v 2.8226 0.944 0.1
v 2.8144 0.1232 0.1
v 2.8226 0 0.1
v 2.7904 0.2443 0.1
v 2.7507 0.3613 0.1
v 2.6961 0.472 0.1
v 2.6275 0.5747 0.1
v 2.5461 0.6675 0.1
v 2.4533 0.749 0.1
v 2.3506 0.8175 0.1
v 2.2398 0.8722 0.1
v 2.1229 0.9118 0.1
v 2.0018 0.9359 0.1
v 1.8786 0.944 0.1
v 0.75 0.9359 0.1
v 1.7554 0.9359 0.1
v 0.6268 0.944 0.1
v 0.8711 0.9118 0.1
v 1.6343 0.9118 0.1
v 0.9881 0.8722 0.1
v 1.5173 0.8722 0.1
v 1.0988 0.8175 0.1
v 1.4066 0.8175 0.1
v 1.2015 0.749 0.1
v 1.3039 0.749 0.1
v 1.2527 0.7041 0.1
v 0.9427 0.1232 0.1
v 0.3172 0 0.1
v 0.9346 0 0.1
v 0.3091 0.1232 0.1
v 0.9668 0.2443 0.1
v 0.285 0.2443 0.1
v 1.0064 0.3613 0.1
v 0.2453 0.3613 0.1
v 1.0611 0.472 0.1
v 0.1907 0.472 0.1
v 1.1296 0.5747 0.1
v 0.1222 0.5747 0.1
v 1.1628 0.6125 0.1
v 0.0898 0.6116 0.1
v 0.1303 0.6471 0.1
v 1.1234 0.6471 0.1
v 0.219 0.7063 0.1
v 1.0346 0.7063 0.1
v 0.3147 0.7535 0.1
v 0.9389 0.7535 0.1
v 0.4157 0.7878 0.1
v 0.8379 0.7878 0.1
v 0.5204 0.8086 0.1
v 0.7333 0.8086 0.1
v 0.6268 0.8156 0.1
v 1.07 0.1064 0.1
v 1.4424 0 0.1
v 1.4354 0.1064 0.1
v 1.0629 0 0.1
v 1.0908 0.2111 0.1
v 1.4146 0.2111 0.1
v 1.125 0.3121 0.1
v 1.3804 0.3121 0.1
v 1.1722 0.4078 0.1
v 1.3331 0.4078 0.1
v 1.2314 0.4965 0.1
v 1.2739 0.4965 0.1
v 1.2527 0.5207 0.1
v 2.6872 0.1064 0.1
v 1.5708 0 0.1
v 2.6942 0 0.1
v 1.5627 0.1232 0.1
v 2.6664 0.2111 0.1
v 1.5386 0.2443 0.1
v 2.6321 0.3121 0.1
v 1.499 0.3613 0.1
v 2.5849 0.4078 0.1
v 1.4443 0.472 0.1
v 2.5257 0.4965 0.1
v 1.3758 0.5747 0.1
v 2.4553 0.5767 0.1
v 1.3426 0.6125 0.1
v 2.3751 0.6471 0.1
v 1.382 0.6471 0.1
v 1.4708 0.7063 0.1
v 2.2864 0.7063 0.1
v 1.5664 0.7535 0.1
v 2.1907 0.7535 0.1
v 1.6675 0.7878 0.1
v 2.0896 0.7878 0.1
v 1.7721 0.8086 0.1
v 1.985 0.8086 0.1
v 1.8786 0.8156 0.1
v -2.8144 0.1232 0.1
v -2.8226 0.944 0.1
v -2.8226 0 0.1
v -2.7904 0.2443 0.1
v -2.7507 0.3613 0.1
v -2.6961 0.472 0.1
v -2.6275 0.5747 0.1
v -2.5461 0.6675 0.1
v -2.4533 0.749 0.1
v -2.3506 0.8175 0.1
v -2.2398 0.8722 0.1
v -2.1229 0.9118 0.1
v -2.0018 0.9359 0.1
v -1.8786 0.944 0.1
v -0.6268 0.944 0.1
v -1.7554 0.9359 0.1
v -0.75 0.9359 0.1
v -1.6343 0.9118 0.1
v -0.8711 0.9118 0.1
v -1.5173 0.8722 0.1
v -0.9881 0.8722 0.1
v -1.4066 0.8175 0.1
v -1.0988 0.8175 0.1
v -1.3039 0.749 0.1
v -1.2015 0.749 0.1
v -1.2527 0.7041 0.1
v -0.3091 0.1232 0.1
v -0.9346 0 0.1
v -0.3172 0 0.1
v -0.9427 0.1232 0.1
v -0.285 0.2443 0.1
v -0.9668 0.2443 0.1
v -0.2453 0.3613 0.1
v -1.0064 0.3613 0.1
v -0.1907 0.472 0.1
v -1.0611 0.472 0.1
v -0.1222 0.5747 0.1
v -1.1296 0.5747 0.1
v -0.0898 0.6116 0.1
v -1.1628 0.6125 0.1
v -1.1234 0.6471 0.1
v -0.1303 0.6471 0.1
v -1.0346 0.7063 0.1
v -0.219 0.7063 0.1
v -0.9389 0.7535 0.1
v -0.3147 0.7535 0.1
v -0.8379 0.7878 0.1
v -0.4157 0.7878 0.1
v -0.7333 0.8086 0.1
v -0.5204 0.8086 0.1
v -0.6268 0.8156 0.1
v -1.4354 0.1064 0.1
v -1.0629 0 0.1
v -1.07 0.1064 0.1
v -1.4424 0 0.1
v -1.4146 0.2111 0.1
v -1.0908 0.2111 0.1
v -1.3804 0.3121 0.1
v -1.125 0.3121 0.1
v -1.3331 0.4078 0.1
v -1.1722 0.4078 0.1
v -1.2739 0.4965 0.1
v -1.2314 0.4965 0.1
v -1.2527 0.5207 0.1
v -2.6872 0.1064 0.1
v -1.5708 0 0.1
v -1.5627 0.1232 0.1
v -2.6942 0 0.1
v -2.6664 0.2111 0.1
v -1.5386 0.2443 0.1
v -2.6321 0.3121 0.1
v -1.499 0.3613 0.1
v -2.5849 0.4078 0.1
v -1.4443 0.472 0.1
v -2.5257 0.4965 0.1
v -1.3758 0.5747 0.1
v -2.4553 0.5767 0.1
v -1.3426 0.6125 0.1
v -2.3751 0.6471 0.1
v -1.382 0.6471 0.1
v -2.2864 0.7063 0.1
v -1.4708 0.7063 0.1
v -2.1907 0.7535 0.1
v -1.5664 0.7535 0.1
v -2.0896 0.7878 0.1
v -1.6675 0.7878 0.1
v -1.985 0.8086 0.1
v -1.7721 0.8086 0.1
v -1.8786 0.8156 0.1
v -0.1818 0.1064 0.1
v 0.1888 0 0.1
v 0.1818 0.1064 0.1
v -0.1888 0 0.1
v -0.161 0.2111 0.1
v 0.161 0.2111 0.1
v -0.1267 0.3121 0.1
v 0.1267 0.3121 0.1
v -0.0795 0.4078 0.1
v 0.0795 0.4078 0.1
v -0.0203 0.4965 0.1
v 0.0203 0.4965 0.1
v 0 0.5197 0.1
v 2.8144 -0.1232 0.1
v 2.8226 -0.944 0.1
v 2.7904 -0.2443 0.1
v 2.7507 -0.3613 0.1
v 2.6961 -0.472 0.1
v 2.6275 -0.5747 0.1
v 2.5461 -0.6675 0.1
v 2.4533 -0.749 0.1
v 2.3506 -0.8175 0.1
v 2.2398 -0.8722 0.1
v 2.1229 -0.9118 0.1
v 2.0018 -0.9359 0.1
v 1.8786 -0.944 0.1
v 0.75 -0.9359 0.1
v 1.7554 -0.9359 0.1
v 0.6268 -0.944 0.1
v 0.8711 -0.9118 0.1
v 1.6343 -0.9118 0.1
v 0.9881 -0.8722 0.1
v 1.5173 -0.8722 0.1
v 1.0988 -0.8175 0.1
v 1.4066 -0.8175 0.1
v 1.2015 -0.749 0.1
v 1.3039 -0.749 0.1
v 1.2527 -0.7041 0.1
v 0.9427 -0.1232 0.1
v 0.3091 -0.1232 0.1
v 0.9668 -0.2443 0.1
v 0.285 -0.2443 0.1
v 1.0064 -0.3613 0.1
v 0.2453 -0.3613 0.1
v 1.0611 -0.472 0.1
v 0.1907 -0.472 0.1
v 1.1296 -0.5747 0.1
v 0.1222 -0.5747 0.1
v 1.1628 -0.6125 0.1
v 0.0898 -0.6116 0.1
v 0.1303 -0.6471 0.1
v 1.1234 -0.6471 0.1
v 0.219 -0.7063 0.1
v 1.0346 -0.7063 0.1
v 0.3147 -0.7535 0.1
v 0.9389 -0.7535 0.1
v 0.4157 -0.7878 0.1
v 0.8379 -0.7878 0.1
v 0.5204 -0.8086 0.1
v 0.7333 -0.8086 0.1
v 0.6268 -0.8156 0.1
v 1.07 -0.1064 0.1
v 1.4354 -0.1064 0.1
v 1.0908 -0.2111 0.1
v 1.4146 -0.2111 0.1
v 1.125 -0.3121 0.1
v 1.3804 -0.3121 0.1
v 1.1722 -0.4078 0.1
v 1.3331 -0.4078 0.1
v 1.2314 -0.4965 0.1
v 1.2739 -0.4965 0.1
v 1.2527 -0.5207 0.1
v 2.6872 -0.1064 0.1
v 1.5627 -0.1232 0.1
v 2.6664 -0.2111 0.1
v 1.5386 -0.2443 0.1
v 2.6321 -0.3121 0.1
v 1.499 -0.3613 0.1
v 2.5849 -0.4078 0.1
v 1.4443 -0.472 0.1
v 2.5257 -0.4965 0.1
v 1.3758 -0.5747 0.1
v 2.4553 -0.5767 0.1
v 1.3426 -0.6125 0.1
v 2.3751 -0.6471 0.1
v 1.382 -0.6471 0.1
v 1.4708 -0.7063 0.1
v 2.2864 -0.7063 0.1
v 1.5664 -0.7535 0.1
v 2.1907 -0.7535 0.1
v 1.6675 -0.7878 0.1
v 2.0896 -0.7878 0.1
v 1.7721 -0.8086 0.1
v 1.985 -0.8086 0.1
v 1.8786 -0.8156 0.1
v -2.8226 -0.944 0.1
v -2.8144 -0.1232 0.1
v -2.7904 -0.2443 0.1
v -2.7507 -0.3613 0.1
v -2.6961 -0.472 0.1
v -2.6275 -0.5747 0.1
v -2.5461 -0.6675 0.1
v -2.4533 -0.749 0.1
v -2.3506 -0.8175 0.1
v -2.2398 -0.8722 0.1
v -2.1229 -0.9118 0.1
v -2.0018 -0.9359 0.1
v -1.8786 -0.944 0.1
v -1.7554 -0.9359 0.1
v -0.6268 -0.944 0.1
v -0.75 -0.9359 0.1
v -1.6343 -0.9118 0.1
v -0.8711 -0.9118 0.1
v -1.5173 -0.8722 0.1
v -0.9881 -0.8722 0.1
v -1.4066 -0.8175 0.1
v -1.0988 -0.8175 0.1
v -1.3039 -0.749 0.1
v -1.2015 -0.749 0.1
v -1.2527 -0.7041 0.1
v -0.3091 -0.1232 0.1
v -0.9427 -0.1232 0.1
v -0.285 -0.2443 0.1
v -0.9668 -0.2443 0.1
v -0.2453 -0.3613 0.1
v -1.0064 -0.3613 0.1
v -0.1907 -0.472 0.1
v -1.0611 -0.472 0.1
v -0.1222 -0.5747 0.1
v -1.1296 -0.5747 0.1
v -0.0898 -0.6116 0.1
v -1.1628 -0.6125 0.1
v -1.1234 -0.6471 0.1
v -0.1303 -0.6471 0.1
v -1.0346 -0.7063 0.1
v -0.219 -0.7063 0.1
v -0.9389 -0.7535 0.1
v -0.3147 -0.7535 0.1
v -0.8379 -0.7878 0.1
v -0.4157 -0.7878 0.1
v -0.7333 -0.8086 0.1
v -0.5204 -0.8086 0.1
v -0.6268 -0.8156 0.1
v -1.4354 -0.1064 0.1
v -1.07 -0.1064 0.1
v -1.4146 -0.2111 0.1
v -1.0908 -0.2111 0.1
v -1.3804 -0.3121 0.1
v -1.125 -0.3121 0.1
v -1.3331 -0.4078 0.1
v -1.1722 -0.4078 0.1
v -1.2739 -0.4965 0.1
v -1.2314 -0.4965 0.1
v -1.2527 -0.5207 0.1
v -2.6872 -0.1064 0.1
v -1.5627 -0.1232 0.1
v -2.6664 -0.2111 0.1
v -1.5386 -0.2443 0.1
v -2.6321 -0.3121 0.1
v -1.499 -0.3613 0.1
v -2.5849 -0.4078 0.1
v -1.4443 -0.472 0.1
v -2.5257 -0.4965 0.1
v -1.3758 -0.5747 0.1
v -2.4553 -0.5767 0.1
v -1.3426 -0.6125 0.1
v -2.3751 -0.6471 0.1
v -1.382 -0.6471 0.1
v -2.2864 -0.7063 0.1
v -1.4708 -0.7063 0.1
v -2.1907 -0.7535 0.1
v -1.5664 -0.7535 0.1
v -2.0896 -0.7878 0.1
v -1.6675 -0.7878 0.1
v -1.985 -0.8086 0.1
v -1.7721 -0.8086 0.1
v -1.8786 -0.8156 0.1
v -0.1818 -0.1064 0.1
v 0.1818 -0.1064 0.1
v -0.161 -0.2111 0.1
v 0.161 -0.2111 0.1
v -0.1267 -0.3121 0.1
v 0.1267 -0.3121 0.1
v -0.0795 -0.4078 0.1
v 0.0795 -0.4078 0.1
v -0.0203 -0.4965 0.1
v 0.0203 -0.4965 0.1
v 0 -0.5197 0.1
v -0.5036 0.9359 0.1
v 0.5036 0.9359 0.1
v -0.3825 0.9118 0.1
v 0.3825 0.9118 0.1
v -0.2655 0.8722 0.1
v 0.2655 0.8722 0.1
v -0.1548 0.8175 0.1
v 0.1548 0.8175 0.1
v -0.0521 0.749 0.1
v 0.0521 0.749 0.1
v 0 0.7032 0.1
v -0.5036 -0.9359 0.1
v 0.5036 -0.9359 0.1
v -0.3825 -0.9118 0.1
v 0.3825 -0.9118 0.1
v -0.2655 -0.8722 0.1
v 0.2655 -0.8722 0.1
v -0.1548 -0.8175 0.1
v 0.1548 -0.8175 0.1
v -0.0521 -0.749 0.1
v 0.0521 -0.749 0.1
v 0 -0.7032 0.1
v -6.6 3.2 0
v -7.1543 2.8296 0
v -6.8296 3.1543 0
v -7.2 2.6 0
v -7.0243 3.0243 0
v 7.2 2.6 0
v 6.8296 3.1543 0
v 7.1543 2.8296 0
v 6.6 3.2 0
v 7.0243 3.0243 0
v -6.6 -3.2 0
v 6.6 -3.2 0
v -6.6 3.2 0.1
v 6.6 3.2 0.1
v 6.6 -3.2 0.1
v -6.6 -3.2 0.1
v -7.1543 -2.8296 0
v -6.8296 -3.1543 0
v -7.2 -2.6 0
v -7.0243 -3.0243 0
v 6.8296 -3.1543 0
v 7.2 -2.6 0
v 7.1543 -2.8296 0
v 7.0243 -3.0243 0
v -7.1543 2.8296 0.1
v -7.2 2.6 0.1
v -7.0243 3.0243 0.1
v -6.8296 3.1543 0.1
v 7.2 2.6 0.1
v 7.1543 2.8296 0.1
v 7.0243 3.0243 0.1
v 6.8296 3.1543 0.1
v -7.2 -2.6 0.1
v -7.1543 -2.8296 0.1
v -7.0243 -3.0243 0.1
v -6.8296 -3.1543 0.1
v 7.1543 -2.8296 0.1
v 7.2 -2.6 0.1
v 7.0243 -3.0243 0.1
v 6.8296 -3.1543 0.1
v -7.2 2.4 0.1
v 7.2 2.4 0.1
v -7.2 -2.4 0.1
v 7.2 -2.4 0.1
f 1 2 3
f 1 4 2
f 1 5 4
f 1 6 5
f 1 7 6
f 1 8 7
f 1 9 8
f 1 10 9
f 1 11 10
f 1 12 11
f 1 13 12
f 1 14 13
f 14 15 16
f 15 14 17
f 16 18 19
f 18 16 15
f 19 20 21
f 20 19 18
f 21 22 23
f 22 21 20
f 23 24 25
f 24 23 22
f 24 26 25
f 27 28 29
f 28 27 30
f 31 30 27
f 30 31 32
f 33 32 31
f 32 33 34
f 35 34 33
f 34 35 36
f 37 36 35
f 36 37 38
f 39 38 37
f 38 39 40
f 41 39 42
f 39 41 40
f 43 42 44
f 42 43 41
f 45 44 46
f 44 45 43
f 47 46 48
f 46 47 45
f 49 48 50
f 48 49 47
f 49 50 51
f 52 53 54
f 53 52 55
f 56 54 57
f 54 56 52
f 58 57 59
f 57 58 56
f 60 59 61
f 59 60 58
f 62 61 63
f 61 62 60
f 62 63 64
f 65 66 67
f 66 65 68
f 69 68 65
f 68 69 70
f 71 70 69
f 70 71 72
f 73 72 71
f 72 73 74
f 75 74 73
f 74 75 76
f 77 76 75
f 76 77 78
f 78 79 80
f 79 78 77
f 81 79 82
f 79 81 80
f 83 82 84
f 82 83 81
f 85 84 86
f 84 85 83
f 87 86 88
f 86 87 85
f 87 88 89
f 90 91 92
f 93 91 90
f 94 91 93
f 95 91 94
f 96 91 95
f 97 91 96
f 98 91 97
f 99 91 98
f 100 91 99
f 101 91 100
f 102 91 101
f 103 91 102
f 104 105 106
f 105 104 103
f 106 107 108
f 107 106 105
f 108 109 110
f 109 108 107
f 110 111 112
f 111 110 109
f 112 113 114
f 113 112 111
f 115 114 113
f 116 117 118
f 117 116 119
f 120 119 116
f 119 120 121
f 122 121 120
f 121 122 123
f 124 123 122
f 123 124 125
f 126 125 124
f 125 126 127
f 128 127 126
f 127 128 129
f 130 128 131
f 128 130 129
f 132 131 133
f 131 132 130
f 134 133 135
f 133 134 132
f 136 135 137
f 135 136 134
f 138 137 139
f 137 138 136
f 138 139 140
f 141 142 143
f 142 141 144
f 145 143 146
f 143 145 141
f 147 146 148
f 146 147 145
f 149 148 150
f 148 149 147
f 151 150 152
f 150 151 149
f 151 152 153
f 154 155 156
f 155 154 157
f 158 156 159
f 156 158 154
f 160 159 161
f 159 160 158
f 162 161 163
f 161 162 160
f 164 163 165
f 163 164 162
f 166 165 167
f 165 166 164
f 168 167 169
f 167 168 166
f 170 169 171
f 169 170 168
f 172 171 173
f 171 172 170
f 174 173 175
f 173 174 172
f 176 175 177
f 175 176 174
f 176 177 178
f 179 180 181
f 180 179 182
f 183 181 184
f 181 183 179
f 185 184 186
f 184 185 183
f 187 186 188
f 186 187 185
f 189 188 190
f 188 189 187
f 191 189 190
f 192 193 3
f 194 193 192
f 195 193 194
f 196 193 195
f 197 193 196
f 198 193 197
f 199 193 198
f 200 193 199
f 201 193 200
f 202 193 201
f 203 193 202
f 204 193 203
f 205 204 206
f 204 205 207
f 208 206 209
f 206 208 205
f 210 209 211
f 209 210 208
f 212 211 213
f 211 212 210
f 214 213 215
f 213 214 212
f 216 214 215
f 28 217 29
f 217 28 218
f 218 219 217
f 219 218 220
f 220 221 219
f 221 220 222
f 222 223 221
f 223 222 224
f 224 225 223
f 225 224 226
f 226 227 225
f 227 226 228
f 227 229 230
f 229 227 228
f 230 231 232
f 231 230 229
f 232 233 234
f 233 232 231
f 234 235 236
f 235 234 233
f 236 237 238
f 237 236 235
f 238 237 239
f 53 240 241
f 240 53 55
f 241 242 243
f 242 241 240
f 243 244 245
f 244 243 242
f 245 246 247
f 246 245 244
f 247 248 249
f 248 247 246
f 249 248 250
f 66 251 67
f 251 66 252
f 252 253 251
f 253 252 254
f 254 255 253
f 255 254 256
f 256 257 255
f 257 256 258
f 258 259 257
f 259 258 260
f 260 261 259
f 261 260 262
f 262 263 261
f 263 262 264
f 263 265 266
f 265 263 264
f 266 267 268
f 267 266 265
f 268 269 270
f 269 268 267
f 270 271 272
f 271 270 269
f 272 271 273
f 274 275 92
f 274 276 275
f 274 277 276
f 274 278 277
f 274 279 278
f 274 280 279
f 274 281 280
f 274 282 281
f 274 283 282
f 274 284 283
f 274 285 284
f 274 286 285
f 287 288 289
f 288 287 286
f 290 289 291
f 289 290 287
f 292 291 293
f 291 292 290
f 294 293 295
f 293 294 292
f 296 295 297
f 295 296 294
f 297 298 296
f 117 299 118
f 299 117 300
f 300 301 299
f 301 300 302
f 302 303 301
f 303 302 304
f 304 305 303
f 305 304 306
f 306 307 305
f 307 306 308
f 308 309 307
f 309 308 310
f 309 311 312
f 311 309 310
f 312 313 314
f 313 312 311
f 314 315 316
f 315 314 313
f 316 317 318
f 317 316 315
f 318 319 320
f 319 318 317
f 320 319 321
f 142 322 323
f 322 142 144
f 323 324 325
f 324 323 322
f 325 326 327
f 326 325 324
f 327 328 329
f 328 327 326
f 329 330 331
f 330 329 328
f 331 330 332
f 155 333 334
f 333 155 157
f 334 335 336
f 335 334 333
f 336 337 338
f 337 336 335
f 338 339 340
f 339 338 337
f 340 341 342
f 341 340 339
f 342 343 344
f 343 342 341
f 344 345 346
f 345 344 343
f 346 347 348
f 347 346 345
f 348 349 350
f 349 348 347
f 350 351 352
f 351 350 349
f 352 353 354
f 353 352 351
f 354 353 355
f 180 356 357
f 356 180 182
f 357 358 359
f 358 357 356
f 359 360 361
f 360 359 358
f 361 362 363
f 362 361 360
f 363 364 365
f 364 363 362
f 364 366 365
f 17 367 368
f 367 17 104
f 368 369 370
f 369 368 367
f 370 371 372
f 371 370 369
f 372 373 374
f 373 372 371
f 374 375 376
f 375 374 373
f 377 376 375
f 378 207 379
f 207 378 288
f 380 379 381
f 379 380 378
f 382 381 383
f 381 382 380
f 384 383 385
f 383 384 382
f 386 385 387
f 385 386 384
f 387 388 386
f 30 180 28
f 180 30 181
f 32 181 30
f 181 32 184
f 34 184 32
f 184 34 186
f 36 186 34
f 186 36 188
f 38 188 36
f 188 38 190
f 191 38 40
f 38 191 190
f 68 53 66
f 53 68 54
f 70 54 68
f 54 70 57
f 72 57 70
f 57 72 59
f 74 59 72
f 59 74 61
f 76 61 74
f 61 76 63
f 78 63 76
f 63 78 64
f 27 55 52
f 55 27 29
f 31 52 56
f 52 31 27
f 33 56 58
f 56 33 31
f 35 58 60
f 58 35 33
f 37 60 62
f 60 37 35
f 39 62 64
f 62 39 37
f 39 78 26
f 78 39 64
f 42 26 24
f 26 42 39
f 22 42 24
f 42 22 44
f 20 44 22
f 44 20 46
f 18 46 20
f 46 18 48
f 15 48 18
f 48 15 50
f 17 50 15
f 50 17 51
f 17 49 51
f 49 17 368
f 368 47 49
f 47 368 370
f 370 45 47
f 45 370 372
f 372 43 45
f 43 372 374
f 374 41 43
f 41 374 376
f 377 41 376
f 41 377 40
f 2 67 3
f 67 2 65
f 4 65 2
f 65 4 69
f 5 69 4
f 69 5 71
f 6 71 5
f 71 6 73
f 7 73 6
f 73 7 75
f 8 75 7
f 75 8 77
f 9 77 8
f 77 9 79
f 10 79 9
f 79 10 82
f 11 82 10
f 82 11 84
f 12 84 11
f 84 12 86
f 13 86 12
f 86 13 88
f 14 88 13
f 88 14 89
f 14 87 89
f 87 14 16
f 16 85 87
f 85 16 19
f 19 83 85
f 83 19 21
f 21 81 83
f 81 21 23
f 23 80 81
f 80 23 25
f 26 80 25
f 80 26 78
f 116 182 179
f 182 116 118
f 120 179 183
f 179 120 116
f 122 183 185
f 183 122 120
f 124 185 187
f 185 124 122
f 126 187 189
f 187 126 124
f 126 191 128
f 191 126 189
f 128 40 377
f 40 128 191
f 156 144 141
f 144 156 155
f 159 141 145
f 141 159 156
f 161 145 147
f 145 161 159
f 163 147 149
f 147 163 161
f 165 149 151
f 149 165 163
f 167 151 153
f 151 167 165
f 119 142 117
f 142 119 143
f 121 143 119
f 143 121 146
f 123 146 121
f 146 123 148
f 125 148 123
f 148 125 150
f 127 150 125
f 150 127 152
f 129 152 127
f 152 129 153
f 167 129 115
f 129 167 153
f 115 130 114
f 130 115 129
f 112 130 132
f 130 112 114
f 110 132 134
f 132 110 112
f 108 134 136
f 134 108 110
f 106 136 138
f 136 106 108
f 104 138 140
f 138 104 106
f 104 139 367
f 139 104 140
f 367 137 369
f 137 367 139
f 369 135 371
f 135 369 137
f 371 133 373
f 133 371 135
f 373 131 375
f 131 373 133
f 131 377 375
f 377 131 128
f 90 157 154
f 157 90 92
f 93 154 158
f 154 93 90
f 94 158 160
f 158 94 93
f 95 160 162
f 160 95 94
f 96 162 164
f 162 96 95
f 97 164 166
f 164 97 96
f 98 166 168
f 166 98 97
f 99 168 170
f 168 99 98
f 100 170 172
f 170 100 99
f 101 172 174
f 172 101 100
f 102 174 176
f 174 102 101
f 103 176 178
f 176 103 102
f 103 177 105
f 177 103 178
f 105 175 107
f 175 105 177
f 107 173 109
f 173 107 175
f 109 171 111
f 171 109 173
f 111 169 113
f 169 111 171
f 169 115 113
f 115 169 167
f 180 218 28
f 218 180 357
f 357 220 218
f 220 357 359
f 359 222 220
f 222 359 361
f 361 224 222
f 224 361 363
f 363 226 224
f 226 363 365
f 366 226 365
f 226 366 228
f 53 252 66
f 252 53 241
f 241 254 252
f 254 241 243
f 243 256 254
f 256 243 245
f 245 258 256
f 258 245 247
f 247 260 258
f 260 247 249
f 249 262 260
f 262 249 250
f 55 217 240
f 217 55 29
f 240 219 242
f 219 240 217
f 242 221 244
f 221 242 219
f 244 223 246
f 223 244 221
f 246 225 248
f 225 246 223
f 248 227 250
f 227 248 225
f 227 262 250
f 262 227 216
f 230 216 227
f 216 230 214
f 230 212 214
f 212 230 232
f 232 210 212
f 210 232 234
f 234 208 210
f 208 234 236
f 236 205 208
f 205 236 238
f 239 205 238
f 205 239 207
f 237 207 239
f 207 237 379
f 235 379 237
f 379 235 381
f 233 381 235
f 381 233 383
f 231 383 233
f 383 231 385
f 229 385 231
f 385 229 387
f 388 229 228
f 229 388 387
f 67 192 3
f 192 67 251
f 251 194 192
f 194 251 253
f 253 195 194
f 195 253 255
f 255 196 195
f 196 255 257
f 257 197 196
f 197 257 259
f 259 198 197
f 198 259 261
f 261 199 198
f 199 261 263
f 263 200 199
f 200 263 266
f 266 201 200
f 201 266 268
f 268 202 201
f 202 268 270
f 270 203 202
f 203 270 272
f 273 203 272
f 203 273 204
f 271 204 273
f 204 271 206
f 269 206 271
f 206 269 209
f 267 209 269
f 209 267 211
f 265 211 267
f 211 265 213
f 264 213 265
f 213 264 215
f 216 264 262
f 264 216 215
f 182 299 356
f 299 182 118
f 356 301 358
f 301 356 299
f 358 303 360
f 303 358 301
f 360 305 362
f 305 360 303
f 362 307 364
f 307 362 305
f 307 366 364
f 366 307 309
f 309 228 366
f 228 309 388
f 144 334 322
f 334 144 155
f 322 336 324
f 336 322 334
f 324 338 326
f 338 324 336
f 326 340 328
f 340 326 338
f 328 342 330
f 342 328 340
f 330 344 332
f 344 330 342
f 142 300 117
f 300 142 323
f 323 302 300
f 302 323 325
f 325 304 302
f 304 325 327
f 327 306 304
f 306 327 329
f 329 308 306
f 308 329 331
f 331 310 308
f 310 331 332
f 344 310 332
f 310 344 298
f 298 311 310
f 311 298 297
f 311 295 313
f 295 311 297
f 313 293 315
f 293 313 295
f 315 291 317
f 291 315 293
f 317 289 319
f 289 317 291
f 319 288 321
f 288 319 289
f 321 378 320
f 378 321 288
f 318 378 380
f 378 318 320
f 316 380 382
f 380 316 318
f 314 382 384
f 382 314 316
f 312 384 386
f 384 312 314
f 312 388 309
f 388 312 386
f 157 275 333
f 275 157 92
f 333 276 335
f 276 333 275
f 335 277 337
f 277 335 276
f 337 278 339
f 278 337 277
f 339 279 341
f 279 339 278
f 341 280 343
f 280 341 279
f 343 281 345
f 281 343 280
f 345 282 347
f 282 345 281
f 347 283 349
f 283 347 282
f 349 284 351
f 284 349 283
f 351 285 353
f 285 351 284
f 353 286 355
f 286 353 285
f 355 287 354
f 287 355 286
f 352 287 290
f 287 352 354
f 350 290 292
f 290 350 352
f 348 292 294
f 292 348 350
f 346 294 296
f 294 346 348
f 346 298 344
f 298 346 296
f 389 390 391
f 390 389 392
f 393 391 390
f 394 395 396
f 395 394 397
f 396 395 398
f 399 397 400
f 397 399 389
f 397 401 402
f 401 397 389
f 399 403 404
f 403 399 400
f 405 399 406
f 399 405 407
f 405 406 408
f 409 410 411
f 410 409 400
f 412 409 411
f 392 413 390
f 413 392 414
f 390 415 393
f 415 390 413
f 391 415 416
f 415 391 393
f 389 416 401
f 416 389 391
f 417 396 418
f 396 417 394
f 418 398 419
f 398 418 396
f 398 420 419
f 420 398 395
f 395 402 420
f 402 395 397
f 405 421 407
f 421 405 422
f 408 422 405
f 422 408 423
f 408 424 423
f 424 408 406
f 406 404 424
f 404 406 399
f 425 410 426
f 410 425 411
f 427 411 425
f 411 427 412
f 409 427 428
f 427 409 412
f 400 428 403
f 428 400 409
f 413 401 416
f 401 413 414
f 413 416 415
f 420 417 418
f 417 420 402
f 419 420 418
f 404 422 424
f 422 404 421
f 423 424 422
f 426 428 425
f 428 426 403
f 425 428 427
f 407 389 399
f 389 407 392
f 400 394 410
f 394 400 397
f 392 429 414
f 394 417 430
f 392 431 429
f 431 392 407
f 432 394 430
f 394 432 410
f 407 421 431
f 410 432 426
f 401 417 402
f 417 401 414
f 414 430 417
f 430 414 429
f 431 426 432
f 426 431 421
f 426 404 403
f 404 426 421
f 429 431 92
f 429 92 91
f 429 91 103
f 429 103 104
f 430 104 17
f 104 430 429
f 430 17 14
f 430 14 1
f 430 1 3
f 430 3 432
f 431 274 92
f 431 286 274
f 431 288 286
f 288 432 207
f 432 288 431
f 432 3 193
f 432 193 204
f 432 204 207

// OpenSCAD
use <../lib.scad>
use <../p/1-4chrd.scad>
use <../p/1-4cyli.scad>
use <../p/box3u12.scad>
use <../p/logo-audi-ring-outerbox.scad>
use <../p/logo-audi-ring.scad>
function ldraw_lib__6142271q() = [
// 0 Sticker  0.8 x  1.8 with White Audi Logo on Red Stripe on Black Background
// 0 Name: 6142271q.dat
// 0 Author: Massimo Maso [Sirio]
// 0 !LDRAW_ORG Part UPDATE 2025-02
// 0 !LICENSE Licensed under CC BY 4.0 : see CAreadme.txt
// 
// 0 BFC CERTIFY CCW
  [0,"BFC","CERTIFY"],
  [0,"BFC","CCW"],
// 
// 0 !KEYWORDS Bricklink 75873stk01a, Brickowl 427960, LMS, R8, Rebrickable 24755
// 0 !KEYWORDS Set 75873, Speed Champions, Ultra
// 
// 0 !HISTORY 2025-02-27 [OrionP] Official Update 2025-02
// 
// 0 // Logo primitives
// 1 4 0 -.25 0 .236 0 0 0 1 0 0 0 .236 logo-audi-ring-outerbox.dat
  [1,4,0,-.25,0,.236,0,0,0,1,0,0,0,.236, ldraw_lib__logo_audi_ring_outerbox()],
// 1 15 0 -.25 0 .236 0 0 0 1 0 0 0 .236 logo-audi-ring.dat
  [1,15,0,-.25,0,.236,0,0,0,1,0,0,0,.236, ldraw_lib__logo_audi_ring()],
// 0 // Primitives
// 1 16 -16.5 0 6.5 -1.5 0 0 0 -1 0 0 0 1.5 1-4chrd.dat
  [1,16,-16.5,0,6.5,-1.5,0,0,0,-1,0,0,0,1.5, ldraw_lib__1_4chrd()],
// 1 16 16.5 0 6.5 1.5 0 0 0 -1 0 0 0 1.5 1-4chrd.dat
  [1,16,16.5,0,6.5,1.5,0,0,0,-1,0,0,0,1.5, ldraw_lib__1_4chrd()],
// 1 16 0 -.25 0 16.5 0 0 0 .25 0 0 0 8 box3u12.dat
  [1,16,0,-.25,0,16.5,0,0,0,.25,0,0,0,8, ldraw_lib__box3u12()],
// 1 16 -16.5 0 -6.5 -1.5 0 0 0 -1 0 0 0 -1.5 1-4chrd.dat
  [1,16,-16.5,0,-6.5,-1.5,0,0,0,-1,0,0,0,-1.5, ldraw_lib__1_4chrd()],
// 1 16 16.5 0 -6.5 1.5 0 0 0 -1 0 0 0 -1.5 1-4chrd.dat
  [1,16,16.5,0,-6.5,1.5,0,0,0,-1,0,0,0,-1.5, ldraw_lib__1_4chrd()],
// 1 16 -16.5 0 6.5 -1.5 0 0 0 -.25 0 0 0 1.5 1-4cyli.dat
  [1,16,-16.5,0,6.5,-1.5,0,0,0,-.25,0,0,0,1.5, ldraw_lib__1_4cyli()],
// 1 16 16.5 0 6.5 1.5 0 0 0 -.25 0 0 0 1.5 1-4cyli.dat
  [1,16,16.5,0,6.5,1.5,0,0,0,-.25,0,0,0,1.5, ldraw_lib__1_4cyli()],
// 1 16 -16.5 0 -6.5 -1.5 0 0 0 -.25 0 0 0 -1.5 1-4cyli.dat
  [1,16,-16.5,0,-6.5,-1.5,0,0,0,-.25,0,0,0,-1.5, ldraw_lib__1_4cyli()],
// 1 16 16.5 0 -6.5 1.5 0 0 0 -.25 0 0 0 -1.5 1-4cyli.dat
  [1,16,16.5,0,-6.5,1.5,0,0,0,-.25,0,0,0,-1.5, ldraw_lib__1_4cyli()],
// 1 0 -16.5 -.25 6.5 -1.5 0 0 0 1 0 0 0 1.5 1-4chrd.dat
  [1,0,-16.5,-.25,6.5,-1.5,0,0,0,1,0,0,0,1.5, ldraw_lib__1_4chrd()],
// 1 0 16.5 -.25 6.5 1.5 0 0 0 1 0 0 0 1.5 1-4chrd.dat
  [1,0,16.5,-.25,6.5,1.5,0,0,0,1,0,0,0,1.5, ldraw_lib__1_4chrd()],
// 1 0 -16.5 -.25 -6.5 -1.5 0 0 0 1 0 0 0 -1.5 1-4chrd.dat
  [1,0,-16.5,-.25,-6.5,-1.5,0,0,0,1,0,0,0,-1.5, ldraw_lib__1_4chrd()],
// 1 0 16.5 -.25 -6.5 1.5 0 0 0 1 0 0 0 -1.5 1-4chrd.dat
  [1,0,16.5,-.25,-6.5,1.5,0,0,0,1,0,0,0,-1.5, ldraw_lib__1_4chrd()],
// 0 // Bottom faces
// 4 16 -16.5 0 8 -16.5 0 -8 -18 0 -6.5 -18 0 6.5
  [4,16,-16.5,0,8,-16.5,0,-8,-18,0,-6.5,-18,0,6.5],
// 4 16 16.5 0 8 18 0 6.5 18 0 -6.5 16.5 0 -8
  [4,16,16.5,0,8,18,0,6.5,18,0,-6.5,16.5,0,-8],
// 0 // Lateral faces
// 3 16 -18 0 6.5 -18 -.25 6 -18 -.25 6.5
  [3,16,-18,0,6.5,-18,-.25,6,-18,-.25,6.5],
// 3 16 18 0 6.5 18 -.25 6.5 18 -.25 6
  [3,16,18,0,6.5,18,-.25,6.5,18,-.25,6],
// 4 16 -18 0 6.5 -18 0 -6.5 -18 -.25 -6 -18 -.25 6
  [4,16,-18,0,6.5,-18,0,-6.5,-18,-.25,-6,-18,-.25,6],
// 4 16 18 0 6.5 18 -.25 6 18 -.25 -6 18 0 -6.5
  [4,16,18,0,6.5,18,-.25,6,18,-.25,-6,18,0,-6.5],
// 3 16 -18 0 -6.5 -18 -.25 -6.5 -18 -.25 -6
  [3,16,-18,0,-6.5,-18,-.25,-6.5,-18,-.25,-6],
// 3 16 18 0 -6.5 18 -.25 -6 18 -.25 -6.5
  [3,16,18,0,-6.5,18,-.25,-6,18,-.25,-6.5],
// 0 // Black top faces
// 4 0 -18 -.25 6.5 18 -.25 6.5 16.5 -.25 8 -16.5 -.25 8
  [4,0,-18,-.25,6.5,18,-.25,6.5,16.5,-.25,8,-16.5,-.25,8],
// 4 0 -18 -.25 6.5 -18 -.25 6 18 -.25 6 18 -.25 6.5
  [4,0,-18,-.25,6.5,-18,-.25,6,18,-.25,6,18,-.25,6.5],
// 4 0 -18 -.25 -6.5 18 -.25 -6.5 18 -.25 -6 -18 -.25 -6
  [4,0,-18,-.25,-6.5,18,-.25,-6.5,18,-.25,-6,-18,-.25,-6],
// 4 0 -18 -.25 -6.5 -16.5 -.25 -8 16.5 -.25 -8 18 -.25 -6.5
  [4,0,-18,-.25,-6.5,-16.5,-.25,-8,16.5,-.25,-8,18,-.25,-6.5],
// 0 // Red top faces
// 3 4 -18 -.25 6 -18 -.25 -6 -7.0564 -.25 0
  [3,4,-18,-.25,6,-18,-.25,-6,-7.0564,-.25,0],
// 3 4 -18 -.25 6 -7.0564 -.25 0 -7.0564 -.25 2.36
  [3,4,-18,-.25,6,-7.0564,-.25,0,-7.0564,-.25,2.36],
// 3 4 -18 -.25 6 -7.0564 -.25 2.36 -4.6964 -.25 2.36
  [3,4,-18,-.25,6,-7.0564,-.25,2.36,-4.6964,-.25,2.36],
// 3 4 -18 -.25 6 -4.6964 -.25 2.36 -1.56704 -.25 2.36
  [3,4,-18,-.25,6,-4.6964,-.25,2.36,-1.56704,-.25,2.36],
// 4 4 -18 -.25 6 -1.56704 -.25 2.36 1.56704 -.25 2.36 18 -.25 6
  [4,4,-18,-.25,6,-1.56704,-.25,2.36,1.56704,-.25,2.36,18,-.25,6],
// 3 4 18 -.25 6 1.56704 -.25 2.36 4.6964 -.25 2.36
  [3,4,18,-.25,6,1.56704,-.25,2.36,4.6964,-.25,2.36],
// 3 4 18 -.25 6 4.6964 -.25 2.36 7.0564 -.25 2.36
  [3,4,18,-.25,6,4.6964,-.25,2.36,7.0564,-.25,2.36],
// 3 4 18 -.25 6 7.0564 -.25 2.36 7.0564 -.25 0
  [3,4,18,-.25,6,7.0564,-.25,2.36,7.0564,-.25,0],
// 3 4 18 -.25 6 7.0564 -.25 0 18 -.25 -6
  [3,4,18,-.25,6,7.0564,-.25,0,18,-.25,-6],
// 3 4 -18 -.25 -6 -7.0564 -.25 -2.36 -7.0564 -.25 0
  [3,4,-18,-.25,-6,-7.0564,-.25,-2.36,-7.0564,-.25,0],
// 3 4 -18 -.25 -6 -4.6964 -.25 -2.36 -7.0564 -.25 -2.36
  [3,4,-18,-.25,-6,-4.6964,-.25,-2.36,-7.0564,-.25,-2.36],
// 3 4 -18 -.25 -6 -1.56704 -.25 -2.36 -4.6964 -.25 -2.36
  [3,4,-18,-.25,-6,-1.56704,-.25,-2.36,-4.6964,-.25,-2.36],
// 4 4 -18 -.25 -6 18 -.25 -6 1.56704 -.25 -2.36 -1.56704 -.25 -2.36
  [4,4,-18,-.25,-6,18,-.25,-6,1.56704,-.25,-2.36,-1.56704,-.25,-2.36],
// 3 4 18 -.25 -6 7.0564 -.25 0 7.0564 -.25 -2.36
  [3,4,18,-.25,-6,7.0564,-.25,0,7.0564,-.25,-2.36],
// 3 4 18 -.25 -6 7.0564 -.25 -2.36 4.6964 -.25 -2.36
  [3,4,18,-.25,-6,7.0564,-.25,-2.36,4.6964,-.25,-2.36],
// 3 4 18 -.25 -6 4.6964 -.25 -2.36 1.56704 -.25 -2.36
  [3,4,18,-.25,-6,4.6964,-.25,-2.36,1.56704,-.25,-2.36],
];
module ldraw_lib__6142271q(step=0, col=false, unit=2/5, alt=false, line=0.2, solid=!$preview)
    makepoly(ldraw_lib__6142271q(), step=step, col=col, unit=unit, alt=alt, line=line, solid=solid);
ldraw_lib__6142271q(line=0.2);
